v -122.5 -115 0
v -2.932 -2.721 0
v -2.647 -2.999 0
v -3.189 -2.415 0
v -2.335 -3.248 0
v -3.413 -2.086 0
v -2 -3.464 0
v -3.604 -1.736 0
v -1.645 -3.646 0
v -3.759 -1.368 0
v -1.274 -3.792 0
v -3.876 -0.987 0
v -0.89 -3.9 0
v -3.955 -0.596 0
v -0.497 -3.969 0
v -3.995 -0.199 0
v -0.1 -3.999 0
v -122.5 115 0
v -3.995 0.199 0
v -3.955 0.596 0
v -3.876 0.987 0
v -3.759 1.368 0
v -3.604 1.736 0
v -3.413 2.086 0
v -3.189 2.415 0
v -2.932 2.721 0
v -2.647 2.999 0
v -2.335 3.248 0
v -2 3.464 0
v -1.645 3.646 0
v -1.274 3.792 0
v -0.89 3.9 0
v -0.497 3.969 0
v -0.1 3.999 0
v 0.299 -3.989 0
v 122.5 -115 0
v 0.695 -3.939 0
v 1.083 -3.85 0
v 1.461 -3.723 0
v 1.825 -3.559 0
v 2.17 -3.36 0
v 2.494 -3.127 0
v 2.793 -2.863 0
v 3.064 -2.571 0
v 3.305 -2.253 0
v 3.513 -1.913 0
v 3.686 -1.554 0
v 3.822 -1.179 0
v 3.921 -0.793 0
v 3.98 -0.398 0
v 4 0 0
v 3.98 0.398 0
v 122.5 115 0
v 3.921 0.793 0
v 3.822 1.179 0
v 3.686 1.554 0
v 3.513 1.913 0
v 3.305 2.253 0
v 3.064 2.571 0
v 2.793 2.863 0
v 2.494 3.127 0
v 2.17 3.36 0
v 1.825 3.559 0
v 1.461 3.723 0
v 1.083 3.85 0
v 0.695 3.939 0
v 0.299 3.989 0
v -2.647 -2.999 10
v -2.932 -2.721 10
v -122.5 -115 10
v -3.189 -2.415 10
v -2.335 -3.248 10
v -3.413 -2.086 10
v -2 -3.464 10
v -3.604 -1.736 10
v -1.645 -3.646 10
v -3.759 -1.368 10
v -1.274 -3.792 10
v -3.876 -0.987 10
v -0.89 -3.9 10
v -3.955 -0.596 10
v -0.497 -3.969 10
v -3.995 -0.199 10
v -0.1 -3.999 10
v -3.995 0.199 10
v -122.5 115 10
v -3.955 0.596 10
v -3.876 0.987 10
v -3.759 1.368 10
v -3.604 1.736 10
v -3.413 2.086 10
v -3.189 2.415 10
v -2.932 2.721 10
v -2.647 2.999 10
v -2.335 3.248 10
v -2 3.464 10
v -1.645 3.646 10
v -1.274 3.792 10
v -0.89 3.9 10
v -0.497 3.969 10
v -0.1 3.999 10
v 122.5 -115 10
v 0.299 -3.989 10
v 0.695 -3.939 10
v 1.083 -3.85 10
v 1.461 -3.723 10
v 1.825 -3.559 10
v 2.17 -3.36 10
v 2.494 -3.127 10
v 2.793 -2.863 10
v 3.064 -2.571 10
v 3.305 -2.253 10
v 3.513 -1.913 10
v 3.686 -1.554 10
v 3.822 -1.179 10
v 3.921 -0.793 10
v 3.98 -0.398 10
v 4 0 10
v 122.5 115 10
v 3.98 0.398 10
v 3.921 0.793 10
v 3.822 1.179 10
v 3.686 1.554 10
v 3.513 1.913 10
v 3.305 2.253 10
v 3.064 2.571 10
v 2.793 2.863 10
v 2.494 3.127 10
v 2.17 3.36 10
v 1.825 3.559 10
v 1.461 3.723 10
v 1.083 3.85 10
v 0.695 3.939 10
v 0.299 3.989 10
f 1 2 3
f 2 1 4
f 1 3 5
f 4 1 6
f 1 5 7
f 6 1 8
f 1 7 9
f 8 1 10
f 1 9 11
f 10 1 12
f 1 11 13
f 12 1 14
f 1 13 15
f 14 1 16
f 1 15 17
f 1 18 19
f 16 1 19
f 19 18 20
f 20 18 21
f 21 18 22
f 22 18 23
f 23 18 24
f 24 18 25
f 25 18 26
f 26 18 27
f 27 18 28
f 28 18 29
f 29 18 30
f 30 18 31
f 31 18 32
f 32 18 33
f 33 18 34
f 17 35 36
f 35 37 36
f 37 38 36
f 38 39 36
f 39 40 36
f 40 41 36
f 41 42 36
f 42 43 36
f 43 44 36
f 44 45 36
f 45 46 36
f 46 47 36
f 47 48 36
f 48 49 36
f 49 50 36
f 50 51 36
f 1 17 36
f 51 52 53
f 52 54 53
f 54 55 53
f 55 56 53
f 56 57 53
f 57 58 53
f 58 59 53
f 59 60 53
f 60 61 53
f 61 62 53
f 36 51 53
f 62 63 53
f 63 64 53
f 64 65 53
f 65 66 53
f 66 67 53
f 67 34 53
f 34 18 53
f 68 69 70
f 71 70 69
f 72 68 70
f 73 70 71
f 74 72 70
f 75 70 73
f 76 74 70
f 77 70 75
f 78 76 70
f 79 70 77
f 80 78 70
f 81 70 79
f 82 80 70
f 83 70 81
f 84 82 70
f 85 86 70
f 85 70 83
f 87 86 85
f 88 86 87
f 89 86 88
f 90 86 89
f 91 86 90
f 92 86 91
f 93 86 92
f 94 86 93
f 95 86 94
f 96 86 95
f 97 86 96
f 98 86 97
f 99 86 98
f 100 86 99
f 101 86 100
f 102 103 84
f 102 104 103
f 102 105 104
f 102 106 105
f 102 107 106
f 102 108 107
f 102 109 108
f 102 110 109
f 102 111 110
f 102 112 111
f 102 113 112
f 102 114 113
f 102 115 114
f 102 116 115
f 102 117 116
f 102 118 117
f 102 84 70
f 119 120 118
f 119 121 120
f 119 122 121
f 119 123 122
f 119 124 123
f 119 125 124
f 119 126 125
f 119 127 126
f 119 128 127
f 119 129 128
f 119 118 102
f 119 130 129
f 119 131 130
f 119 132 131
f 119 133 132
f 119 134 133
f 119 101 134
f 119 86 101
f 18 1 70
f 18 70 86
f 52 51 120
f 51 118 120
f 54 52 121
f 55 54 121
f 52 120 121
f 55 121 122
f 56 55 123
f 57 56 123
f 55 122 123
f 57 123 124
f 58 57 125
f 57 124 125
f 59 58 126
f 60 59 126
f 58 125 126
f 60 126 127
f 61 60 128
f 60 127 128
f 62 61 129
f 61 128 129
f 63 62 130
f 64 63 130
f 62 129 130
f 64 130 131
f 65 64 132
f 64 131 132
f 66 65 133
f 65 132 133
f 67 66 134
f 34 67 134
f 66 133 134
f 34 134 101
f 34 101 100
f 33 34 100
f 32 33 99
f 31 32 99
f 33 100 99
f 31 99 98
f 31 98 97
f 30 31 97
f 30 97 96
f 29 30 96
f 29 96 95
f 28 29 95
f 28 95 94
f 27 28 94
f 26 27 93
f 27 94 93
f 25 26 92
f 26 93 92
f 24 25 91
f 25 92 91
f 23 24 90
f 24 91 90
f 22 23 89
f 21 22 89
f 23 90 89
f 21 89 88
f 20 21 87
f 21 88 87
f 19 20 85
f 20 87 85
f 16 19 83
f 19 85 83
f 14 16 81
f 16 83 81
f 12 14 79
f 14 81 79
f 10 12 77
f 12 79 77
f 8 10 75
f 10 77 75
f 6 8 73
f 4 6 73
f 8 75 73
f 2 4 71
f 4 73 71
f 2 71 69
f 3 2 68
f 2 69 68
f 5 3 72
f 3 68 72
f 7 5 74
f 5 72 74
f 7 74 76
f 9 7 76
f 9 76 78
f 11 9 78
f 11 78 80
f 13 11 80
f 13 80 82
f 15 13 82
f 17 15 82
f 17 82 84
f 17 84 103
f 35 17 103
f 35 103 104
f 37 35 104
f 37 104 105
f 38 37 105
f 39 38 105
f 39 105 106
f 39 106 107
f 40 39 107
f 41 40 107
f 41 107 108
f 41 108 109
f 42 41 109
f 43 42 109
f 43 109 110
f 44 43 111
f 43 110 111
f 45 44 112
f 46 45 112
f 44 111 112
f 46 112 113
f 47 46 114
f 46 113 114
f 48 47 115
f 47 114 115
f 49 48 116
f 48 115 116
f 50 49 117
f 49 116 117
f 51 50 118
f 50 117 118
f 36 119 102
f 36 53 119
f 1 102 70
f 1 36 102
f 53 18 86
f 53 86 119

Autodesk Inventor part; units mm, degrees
ref_plane "YZ Plane" through (0, 0, 0) normal (1, 0, 0) x (0, 1, 0)
ref_plane "XZ Plane" through (0, 0, 0) normal (0, 1, 0) x (-1, 0, 0)
ref_plane "XY Plane" through (0, 0, 0) normal (0, 0, 1) x (1, 0, 0)
sketch "Sketch1" plane through (0, 0, 0) normal (0, 0, 1) x (1, 0, 0)
  line L0 (-122.5, 115) -> (122.5, 115)
  line L1 (122.5, 115) -> (122.5, -115)
  line L2 (122.5, -115) -> (-122.5, -115)
  line L3 (-122.5, -115) -> (-122.5, 115)
  point P0 (0, 0)
  dimension "d0" = 245
  dimension "d1" = 230
  dimension "d2" = 122.5
  dimension "d3" = 115
extrude "Extrusion1" add sketch "Sketch1" along normal blind 10
sketch "Sketch2" plane through (0, 0, 10) normal (0, 0, 1) x (1, 0, 0)
  circle A0 centre (0, 0) radius 4
  dimension "d6" = 8
extrude "Extrusion2" cut sketch "Sketch2" against normal up to next
equation "\"d2\" = 0.5 * d0"
equation "\"d3\" = 0.5 * d1"
properties part number "Base" material "ABS Plastic"
